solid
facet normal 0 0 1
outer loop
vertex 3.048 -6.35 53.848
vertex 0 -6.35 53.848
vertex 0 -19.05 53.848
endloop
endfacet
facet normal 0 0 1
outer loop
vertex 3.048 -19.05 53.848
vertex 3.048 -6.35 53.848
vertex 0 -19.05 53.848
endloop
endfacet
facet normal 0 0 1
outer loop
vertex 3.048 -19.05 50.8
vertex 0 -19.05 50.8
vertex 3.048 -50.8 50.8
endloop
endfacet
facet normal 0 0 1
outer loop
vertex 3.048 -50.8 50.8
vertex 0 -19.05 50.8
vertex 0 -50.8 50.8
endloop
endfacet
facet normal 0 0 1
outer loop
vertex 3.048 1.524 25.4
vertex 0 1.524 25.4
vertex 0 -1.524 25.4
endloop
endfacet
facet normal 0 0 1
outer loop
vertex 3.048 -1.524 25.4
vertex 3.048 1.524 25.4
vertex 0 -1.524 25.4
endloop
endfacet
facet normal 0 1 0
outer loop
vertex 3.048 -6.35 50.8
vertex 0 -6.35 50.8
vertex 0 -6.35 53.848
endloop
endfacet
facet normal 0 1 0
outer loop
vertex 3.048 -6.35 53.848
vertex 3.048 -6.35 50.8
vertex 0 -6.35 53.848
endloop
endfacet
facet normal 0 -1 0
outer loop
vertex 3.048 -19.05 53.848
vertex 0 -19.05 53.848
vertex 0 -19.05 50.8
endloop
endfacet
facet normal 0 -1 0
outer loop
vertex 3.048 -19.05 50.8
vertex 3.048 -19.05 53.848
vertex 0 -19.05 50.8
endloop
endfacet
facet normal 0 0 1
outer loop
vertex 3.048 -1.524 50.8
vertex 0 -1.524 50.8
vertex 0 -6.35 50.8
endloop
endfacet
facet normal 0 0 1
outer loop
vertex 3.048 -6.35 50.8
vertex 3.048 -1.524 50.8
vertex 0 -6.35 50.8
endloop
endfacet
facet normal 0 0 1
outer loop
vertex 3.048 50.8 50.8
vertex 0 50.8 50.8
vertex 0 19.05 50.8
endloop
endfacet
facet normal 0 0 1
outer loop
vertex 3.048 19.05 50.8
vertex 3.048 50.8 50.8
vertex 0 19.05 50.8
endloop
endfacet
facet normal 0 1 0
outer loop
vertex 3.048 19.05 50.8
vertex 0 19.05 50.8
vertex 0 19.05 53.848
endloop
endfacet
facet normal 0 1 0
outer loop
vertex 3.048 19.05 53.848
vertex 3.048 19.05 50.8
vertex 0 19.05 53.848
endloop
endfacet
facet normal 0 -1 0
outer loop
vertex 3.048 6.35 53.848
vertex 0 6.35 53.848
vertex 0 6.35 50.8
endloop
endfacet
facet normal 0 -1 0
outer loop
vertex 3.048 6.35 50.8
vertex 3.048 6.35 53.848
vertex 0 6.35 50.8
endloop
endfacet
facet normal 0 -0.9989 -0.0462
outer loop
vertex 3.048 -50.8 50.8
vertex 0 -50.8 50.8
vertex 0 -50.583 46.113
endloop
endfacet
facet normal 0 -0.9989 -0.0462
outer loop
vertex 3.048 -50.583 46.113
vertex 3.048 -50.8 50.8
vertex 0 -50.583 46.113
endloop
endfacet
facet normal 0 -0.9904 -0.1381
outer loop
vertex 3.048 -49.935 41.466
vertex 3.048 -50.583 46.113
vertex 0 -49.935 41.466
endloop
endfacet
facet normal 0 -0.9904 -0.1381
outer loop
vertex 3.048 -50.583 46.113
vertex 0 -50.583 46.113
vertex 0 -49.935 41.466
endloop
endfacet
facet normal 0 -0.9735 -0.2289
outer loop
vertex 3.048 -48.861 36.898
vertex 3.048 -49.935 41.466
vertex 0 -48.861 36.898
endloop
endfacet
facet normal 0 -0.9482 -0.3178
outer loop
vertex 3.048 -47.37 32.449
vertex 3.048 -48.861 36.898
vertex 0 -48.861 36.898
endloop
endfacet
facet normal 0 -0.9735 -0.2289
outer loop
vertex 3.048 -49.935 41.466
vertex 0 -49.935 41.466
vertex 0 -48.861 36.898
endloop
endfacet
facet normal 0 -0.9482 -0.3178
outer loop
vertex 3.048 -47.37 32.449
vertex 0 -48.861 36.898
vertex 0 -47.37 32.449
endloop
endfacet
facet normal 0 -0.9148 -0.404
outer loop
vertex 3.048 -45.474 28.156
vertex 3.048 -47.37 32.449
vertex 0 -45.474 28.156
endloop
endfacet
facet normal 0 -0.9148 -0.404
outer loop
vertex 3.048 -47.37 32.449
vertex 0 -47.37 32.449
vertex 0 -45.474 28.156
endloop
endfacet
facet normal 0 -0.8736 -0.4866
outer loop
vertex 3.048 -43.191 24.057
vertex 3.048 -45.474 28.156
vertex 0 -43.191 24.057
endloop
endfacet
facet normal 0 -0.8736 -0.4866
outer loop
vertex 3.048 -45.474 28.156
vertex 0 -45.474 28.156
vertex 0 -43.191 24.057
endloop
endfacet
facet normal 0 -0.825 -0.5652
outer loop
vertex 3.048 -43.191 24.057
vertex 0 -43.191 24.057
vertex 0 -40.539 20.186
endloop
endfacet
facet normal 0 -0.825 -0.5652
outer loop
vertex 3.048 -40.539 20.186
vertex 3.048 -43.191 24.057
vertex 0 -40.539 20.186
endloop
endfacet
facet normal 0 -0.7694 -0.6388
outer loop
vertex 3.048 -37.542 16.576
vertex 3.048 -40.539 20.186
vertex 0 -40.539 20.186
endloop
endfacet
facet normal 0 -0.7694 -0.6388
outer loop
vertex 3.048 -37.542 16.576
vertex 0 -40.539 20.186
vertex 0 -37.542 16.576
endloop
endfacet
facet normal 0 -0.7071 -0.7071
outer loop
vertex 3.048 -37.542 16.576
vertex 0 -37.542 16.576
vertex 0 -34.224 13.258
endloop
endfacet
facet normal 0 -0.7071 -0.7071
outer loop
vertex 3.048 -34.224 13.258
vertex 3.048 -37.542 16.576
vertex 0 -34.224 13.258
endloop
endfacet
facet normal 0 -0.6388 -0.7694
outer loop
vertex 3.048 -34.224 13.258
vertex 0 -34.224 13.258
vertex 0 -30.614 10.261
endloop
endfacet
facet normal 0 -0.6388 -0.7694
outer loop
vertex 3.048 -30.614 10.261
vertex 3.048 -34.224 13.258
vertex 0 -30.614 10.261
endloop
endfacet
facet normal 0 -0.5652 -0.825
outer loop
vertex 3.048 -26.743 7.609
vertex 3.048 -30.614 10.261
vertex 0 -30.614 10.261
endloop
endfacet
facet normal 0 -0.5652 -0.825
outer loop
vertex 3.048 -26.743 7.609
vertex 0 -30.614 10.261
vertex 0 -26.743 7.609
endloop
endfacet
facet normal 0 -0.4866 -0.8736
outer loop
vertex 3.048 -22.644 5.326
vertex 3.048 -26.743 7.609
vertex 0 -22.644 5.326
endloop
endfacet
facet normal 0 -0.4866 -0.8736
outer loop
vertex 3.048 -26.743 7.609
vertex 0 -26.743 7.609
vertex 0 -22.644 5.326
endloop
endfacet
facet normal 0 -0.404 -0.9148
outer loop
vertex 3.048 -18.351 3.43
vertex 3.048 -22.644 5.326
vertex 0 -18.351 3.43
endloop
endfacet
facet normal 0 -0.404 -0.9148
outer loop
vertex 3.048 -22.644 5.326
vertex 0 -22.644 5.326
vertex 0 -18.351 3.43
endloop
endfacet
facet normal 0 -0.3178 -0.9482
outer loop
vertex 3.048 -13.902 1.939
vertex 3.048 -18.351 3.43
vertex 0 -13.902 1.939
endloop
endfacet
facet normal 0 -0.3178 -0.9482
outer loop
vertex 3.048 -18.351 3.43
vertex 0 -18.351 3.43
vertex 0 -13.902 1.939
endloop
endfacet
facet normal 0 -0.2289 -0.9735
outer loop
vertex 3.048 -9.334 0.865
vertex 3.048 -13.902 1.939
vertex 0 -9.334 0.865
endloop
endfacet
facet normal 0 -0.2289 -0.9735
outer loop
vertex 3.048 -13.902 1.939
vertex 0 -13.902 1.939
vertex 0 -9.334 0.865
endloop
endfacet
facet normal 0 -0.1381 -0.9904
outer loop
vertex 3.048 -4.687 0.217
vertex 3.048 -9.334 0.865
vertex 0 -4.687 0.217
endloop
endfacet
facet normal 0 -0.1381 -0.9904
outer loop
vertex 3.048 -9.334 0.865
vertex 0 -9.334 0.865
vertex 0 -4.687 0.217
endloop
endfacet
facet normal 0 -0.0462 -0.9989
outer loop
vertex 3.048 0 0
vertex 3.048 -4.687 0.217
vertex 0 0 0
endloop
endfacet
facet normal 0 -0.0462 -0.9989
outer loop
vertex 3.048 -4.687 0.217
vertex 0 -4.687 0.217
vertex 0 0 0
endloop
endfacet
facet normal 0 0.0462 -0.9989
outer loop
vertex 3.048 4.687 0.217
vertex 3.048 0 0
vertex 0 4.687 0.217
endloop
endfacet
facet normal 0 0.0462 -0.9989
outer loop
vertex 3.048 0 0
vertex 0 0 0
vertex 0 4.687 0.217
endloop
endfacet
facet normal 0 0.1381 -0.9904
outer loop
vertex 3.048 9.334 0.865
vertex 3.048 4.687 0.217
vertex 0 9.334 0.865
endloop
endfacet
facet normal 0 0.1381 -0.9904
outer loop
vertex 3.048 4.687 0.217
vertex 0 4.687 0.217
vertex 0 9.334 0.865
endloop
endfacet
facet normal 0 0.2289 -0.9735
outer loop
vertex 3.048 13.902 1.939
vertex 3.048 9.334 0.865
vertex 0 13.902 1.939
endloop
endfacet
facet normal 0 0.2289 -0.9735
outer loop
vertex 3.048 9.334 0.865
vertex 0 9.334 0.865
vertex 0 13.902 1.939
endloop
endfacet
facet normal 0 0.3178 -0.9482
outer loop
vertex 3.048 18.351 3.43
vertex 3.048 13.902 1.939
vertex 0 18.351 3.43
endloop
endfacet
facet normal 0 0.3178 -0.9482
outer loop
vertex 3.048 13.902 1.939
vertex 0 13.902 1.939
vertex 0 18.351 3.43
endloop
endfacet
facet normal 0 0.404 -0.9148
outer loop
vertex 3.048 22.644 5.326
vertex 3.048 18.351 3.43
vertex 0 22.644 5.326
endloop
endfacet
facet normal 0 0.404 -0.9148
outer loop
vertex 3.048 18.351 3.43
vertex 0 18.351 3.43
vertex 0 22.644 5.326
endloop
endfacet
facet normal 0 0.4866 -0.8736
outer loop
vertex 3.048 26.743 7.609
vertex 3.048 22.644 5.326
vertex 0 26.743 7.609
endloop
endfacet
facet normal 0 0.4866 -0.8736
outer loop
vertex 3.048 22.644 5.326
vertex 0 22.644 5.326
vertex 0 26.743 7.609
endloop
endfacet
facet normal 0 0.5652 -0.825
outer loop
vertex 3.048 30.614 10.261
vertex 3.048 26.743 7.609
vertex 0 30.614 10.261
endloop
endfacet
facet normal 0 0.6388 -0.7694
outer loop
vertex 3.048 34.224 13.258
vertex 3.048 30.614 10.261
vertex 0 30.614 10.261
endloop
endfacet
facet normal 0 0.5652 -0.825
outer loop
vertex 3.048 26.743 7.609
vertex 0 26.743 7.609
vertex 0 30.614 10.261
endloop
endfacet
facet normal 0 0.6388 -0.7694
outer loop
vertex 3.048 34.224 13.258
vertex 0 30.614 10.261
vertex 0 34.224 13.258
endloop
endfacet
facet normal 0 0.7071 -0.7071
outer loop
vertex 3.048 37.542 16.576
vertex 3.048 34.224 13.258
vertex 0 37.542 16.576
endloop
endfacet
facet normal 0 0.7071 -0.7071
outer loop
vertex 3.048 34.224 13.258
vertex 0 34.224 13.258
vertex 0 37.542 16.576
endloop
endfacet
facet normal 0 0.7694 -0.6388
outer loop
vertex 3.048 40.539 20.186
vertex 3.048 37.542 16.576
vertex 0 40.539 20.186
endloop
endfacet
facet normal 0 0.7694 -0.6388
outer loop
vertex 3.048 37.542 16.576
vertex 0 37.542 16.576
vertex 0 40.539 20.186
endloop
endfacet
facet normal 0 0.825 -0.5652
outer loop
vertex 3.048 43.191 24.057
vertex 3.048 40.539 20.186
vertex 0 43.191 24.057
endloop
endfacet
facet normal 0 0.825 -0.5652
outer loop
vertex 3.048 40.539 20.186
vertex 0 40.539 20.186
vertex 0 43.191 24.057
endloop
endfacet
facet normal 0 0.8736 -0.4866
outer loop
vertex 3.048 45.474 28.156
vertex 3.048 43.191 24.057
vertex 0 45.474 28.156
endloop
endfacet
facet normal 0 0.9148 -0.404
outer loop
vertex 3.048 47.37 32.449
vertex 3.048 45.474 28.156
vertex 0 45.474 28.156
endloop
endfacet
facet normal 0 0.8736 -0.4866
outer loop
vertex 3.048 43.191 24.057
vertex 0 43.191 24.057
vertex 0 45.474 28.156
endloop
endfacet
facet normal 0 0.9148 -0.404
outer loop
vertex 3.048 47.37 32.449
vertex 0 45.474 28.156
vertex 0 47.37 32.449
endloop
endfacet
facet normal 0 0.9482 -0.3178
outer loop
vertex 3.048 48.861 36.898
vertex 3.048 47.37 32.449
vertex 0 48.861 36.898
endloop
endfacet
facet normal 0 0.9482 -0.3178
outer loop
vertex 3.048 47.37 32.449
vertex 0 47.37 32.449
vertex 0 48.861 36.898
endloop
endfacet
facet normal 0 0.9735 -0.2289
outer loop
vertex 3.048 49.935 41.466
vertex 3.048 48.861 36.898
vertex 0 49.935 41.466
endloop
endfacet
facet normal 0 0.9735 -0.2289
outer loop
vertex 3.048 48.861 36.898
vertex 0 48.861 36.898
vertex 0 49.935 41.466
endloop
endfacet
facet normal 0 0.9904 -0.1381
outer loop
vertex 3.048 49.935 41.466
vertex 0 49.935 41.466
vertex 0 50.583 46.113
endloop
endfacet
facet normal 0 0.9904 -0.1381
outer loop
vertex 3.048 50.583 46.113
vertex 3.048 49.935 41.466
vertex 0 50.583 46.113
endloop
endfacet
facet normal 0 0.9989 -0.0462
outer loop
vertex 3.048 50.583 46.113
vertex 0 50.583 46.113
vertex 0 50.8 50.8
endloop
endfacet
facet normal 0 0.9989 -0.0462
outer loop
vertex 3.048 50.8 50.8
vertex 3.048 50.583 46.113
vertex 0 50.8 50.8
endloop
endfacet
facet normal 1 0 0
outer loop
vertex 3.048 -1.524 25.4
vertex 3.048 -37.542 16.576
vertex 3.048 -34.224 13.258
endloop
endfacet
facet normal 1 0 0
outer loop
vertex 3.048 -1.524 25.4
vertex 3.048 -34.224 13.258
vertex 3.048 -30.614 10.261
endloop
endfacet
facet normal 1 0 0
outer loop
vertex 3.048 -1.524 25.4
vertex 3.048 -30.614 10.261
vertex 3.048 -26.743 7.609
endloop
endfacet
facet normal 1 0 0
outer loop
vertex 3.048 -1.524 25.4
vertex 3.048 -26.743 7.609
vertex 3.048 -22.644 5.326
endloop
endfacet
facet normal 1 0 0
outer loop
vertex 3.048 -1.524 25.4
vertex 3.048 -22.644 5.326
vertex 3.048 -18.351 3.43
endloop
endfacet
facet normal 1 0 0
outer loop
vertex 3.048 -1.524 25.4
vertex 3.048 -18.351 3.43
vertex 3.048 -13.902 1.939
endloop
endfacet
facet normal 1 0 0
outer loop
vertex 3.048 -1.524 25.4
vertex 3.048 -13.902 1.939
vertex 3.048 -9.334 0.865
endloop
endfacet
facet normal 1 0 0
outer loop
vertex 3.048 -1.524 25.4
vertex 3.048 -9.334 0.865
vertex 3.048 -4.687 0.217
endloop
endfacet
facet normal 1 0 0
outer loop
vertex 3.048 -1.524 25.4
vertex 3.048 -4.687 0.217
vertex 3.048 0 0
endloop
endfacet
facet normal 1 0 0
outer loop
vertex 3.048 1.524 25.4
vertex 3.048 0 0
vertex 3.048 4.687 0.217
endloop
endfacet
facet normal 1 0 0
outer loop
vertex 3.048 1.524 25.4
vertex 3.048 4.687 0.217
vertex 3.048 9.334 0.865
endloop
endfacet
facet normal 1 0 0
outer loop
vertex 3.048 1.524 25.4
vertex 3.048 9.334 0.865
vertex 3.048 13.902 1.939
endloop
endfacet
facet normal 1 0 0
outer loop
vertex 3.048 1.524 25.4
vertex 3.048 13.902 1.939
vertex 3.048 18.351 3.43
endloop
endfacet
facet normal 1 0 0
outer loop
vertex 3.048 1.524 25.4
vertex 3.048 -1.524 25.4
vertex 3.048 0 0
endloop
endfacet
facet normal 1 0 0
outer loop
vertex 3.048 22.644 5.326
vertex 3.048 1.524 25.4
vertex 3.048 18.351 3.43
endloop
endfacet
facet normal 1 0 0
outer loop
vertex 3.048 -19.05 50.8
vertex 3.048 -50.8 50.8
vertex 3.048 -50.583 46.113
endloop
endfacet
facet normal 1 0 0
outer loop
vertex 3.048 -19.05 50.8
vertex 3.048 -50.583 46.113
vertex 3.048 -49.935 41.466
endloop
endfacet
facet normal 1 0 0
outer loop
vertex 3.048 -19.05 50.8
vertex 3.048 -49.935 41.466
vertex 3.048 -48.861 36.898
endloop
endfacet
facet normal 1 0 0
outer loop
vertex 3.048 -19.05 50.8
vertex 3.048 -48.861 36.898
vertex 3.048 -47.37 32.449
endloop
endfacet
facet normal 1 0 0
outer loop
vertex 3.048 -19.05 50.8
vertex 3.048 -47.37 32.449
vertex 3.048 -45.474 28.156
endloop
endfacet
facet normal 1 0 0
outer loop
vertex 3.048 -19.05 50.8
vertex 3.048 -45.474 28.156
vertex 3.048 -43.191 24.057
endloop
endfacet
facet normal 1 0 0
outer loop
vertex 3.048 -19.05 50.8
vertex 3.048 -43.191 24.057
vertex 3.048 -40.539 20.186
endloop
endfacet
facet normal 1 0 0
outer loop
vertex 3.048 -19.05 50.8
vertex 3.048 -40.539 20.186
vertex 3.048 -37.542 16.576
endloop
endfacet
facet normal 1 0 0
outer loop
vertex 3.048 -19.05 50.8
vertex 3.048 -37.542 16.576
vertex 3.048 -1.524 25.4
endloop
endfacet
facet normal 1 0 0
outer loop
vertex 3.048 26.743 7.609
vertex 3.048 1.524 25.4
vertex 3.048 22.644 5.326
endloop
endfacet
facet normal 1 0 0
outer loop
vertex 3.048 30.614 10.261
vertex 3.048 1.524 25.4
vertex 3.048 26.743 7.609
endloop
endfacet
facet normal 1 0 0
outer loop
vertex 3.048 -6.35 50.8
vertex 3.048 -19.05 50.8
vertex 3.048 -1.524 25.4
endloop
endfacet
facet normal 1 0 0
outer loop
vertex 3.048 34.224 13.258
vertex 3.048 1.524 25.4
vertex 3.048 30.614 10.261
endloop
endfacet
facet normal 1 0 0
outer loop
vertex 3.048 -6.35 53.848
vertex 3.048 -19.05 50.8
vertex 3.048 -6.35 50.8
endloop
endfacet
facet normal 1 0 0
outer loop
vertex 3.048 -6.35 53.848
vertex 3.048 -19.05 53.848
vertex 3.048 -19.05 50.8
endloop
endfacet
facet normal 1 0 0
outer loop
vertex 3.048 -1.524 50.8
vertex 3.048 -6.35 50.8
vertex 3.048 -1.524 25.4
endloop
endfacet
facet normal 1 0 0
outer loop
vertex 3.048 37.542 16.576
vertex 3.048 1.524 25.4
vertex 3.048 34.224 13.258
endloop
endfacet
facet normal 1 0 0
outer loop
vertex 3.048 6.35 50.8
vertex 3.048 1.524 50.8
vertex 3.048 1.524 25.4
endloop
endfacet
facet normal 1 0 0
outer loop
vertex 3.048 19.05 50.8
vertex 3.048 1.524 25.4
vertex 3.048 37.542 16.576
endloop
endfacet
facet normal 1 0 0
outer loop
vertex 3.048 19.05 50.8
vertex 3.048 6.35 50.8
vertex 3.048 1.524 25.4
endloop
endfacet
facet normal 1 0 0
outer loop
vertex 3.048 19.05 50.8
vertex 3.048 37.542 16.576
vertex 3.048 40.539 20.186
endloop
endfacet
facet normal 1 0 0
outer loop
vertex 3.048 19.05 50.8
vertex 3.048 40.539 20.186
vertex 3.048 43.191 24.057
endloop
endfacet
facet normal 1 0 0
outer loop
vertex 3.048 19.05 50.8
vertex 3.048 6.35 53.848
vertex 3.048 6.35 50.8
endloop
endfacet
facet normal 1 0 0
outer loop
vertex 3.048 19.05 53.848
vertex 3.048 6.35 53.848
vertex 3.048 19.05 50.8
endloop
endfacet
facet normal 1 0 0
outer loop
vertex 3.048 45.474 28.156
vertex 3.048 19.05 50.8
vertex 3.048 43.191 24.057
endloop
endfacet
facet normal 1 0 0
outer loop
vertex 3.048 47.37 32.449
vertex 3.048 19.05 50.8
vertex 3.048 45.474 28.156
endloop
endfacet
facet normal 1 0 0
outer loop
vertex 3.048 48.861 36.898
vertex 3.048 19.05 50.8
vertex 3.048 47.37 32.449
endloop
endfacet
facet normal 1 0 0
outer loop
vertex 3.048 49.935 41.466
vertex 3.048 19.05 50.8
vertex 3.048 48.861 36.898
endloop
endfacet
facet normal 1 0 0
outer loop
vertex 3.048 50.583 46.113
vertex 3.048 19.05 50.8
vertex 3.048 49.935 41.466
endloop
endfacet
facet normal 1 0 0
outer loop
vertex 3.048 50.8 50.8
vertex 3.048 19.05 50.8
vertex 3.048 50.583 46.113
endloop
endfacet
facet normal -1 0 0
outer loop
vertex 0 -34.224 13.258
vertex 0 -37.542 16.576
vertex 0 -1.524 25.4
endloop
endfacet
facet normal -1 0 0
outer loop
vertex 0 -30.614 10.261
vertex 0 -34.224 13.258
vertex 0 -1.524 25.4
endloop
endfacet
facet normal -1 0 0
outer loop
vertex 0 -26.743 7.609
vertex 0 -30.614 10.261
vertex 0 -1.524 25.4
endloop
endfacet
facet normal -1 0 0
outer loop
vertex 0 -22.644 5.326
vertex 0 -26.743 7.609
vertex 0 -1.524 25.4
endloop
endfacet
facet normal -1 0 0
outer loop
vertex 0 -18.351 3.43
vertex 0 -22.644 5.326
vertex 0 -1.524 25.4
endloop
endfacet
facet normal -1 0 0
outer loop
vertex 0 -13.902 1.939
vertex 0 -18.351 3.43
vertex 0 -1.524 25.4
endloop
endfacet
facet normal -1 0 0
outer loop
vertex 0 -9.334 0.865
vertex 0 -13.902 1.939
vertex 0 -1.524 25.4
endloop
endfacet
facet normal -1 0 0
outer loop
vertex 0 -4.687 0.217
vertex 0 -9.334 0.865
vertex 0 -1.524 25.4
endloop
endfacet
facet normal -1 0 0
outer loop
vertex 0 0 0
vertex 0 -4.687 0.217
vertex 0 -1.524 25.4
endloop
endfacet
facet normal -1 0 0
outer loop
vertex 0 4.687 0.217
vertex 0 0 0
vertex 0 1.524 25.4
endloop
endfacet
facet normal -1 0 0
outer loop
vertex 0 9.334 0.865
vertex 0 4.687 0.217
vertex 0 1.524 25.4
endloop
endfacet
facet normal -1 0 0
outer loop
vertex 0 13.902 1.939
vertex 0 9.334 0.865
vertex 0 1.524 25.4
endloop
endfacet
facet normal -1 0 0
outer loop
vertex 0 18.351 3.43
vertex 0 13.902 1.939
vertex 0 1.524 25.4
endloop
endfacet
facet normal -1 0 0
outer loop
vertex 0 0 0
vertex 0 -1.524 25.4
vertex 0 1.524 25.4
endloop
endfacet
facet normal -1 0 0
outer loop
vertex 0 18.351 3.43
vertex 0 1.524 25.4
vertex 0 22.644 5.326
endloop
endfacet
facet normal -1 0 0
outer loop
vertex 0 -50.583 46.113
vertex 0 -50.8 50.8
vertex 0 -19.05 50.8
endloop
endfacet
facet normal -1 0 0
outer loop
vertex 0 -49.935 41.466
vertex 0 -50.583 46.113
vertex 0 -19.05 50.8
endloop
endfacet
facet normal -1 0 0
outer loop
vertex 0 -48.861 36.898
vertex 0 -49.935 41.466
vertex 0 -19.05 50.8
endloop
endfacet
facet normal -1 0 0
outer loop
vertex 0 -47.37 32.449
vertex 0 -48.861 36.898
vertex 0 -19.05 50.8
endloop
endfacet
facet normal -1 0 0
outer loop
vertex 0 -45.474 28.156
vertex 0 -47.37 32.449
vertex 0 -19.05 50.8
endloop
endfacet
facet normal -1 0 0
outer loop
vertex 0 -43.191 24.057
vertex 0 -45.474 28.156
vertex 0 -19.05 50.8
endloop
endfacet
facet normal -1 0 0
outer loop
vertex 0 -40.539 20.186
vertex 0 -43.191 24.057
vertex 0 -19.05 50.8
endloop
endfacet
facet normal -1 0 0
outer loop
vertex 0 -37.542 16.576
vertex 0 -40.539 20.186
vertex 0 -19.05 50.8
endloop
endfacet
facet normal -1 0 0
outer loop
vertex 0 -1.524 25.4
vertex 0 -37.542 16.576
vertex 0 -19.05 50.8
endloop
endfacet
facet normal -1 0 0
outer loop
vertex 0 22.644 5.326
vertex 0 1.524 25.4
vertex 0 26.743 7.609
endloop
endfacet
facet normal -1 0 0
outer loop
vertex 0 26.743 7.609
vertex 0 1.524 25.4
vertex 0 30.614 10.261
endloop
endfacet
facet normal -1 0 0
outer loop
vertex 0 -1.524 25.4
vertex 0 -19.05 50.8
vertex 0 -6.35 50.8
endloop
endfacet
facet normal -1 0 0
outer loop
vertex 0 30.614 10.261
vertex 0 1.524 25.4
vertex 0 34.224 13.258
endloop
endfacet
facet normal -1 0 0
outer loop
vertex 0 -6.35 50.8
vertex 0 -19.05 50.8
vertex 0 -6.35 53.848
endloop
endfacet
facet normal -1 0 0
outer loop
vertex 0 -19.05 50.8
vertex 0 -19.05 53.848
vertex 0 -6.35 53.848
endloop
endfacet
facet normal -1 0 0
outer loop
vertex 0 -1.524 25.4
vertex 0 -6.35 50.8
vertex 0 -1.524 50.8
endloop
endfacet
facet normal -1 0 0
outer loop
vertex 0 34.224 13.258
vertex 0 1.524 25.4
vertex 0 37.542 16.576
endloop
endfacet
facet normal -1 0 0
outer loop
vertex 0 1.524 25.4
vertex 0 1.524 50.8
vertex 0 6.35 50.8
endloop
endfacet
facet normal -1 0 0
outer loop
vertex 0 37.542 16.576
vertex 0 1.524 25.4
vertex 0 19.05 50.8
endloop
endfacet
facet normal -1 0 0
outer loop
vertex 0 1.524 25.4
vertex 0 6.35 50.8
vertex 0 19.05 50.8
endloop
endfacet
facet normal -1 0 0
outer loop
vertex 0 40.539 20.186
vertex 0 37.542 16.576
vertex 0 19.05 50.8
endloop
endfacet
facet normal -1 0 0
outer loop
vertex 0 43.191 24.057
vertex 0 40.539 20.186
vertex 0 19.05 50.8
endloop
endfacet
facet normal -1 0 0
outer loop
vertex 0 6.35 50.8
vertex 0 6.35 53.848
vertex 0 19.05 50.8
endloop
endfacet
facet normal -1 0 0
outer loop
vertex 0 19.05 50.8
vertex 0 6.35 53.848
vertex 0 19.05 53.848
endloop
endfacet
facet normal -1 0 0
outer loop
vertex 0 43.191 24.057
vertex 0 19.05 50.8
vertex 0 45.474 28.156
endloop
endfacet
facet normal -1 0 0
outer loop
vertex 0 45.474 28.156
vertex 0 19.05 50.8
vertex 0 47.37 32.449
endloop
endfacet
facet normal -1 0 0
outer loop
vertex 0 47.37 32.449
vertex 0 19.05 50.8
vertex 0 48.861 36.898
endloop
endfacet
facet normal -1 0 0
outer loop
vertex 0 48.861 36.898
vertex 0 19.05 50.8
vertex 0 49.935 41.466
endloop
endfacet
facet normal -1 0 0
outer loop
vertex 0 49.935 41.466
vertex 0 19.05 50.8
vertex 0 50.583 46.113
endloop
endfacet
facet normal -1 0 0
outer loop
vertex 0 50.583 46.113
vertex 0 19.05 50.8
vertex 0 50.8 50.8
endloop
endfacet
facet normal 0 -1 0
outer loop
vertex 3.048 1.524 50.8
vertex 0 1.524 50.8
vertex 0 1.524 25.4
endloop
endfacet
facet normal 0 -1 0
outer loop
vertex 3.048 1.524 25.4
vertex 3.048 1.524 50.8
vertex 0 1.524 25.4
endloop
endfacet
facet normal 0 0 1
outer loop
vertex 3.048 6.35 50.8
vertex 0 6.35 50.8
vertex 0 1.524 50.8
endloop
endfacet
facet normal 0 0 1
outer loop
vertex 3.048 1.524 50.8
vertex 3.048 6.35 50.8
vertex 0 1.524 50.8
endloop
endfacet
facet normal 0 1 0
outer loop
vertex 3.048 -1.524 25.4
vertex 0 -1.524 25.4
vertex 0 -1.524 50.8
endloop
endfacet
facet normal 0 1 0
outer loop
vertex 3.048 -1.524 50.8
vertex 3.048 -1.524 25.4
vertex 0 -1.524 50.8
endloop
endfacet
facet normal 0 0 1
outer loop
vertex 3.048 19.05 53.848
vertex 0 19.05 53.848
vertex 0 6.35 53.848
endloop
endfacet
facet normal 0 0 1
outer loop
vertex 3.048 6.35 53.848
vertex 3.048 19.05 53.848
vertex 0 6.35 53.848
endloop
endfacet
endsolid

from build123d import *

# Parameters (mm, degrees)
F1_DEPTH = 3.048


with BuildPart() as f1:
    # F0 (on Right) → F1 (new body)
    with BuildSketch(Plane.YZ):
        with BuildLine():
            Line((-19.05, 50.8), (-50.8, 50.8))
            ThreePointArc((-50.8, 50.8), (0, 0), (50.8, 50.8))
            Line((50.8, 50.8), (19.05, 50.8))
            Line((19.05, 50.8), (19.05, 53.848))
            Line((19.05, 53.848), (6.35, 53.848))
            Line((6.35, 53.848), (6.35, 50.8))
            Line((6.35, 50.8), (1.524, 50.8))
            Line((1.524, 50.8), (1.524, 25.4))
            Line((1.524, 25.4), (-1.524, 25.4))
            Line((-1.524, 25.4), (-1.524, 50.8))
            Line((-1.524, 50.8), (-6.35, 50.8))
            Line((-6.35, 50.8), (-6.35, 53.848))
            Line((-6.35, 53.848), (-19.05, 53.848))
            Line((-19.05, 53.848), (-19.05, 50.8))
        make_face()
    extrude(amount=F1_DEPTH)


solid = f1.part
